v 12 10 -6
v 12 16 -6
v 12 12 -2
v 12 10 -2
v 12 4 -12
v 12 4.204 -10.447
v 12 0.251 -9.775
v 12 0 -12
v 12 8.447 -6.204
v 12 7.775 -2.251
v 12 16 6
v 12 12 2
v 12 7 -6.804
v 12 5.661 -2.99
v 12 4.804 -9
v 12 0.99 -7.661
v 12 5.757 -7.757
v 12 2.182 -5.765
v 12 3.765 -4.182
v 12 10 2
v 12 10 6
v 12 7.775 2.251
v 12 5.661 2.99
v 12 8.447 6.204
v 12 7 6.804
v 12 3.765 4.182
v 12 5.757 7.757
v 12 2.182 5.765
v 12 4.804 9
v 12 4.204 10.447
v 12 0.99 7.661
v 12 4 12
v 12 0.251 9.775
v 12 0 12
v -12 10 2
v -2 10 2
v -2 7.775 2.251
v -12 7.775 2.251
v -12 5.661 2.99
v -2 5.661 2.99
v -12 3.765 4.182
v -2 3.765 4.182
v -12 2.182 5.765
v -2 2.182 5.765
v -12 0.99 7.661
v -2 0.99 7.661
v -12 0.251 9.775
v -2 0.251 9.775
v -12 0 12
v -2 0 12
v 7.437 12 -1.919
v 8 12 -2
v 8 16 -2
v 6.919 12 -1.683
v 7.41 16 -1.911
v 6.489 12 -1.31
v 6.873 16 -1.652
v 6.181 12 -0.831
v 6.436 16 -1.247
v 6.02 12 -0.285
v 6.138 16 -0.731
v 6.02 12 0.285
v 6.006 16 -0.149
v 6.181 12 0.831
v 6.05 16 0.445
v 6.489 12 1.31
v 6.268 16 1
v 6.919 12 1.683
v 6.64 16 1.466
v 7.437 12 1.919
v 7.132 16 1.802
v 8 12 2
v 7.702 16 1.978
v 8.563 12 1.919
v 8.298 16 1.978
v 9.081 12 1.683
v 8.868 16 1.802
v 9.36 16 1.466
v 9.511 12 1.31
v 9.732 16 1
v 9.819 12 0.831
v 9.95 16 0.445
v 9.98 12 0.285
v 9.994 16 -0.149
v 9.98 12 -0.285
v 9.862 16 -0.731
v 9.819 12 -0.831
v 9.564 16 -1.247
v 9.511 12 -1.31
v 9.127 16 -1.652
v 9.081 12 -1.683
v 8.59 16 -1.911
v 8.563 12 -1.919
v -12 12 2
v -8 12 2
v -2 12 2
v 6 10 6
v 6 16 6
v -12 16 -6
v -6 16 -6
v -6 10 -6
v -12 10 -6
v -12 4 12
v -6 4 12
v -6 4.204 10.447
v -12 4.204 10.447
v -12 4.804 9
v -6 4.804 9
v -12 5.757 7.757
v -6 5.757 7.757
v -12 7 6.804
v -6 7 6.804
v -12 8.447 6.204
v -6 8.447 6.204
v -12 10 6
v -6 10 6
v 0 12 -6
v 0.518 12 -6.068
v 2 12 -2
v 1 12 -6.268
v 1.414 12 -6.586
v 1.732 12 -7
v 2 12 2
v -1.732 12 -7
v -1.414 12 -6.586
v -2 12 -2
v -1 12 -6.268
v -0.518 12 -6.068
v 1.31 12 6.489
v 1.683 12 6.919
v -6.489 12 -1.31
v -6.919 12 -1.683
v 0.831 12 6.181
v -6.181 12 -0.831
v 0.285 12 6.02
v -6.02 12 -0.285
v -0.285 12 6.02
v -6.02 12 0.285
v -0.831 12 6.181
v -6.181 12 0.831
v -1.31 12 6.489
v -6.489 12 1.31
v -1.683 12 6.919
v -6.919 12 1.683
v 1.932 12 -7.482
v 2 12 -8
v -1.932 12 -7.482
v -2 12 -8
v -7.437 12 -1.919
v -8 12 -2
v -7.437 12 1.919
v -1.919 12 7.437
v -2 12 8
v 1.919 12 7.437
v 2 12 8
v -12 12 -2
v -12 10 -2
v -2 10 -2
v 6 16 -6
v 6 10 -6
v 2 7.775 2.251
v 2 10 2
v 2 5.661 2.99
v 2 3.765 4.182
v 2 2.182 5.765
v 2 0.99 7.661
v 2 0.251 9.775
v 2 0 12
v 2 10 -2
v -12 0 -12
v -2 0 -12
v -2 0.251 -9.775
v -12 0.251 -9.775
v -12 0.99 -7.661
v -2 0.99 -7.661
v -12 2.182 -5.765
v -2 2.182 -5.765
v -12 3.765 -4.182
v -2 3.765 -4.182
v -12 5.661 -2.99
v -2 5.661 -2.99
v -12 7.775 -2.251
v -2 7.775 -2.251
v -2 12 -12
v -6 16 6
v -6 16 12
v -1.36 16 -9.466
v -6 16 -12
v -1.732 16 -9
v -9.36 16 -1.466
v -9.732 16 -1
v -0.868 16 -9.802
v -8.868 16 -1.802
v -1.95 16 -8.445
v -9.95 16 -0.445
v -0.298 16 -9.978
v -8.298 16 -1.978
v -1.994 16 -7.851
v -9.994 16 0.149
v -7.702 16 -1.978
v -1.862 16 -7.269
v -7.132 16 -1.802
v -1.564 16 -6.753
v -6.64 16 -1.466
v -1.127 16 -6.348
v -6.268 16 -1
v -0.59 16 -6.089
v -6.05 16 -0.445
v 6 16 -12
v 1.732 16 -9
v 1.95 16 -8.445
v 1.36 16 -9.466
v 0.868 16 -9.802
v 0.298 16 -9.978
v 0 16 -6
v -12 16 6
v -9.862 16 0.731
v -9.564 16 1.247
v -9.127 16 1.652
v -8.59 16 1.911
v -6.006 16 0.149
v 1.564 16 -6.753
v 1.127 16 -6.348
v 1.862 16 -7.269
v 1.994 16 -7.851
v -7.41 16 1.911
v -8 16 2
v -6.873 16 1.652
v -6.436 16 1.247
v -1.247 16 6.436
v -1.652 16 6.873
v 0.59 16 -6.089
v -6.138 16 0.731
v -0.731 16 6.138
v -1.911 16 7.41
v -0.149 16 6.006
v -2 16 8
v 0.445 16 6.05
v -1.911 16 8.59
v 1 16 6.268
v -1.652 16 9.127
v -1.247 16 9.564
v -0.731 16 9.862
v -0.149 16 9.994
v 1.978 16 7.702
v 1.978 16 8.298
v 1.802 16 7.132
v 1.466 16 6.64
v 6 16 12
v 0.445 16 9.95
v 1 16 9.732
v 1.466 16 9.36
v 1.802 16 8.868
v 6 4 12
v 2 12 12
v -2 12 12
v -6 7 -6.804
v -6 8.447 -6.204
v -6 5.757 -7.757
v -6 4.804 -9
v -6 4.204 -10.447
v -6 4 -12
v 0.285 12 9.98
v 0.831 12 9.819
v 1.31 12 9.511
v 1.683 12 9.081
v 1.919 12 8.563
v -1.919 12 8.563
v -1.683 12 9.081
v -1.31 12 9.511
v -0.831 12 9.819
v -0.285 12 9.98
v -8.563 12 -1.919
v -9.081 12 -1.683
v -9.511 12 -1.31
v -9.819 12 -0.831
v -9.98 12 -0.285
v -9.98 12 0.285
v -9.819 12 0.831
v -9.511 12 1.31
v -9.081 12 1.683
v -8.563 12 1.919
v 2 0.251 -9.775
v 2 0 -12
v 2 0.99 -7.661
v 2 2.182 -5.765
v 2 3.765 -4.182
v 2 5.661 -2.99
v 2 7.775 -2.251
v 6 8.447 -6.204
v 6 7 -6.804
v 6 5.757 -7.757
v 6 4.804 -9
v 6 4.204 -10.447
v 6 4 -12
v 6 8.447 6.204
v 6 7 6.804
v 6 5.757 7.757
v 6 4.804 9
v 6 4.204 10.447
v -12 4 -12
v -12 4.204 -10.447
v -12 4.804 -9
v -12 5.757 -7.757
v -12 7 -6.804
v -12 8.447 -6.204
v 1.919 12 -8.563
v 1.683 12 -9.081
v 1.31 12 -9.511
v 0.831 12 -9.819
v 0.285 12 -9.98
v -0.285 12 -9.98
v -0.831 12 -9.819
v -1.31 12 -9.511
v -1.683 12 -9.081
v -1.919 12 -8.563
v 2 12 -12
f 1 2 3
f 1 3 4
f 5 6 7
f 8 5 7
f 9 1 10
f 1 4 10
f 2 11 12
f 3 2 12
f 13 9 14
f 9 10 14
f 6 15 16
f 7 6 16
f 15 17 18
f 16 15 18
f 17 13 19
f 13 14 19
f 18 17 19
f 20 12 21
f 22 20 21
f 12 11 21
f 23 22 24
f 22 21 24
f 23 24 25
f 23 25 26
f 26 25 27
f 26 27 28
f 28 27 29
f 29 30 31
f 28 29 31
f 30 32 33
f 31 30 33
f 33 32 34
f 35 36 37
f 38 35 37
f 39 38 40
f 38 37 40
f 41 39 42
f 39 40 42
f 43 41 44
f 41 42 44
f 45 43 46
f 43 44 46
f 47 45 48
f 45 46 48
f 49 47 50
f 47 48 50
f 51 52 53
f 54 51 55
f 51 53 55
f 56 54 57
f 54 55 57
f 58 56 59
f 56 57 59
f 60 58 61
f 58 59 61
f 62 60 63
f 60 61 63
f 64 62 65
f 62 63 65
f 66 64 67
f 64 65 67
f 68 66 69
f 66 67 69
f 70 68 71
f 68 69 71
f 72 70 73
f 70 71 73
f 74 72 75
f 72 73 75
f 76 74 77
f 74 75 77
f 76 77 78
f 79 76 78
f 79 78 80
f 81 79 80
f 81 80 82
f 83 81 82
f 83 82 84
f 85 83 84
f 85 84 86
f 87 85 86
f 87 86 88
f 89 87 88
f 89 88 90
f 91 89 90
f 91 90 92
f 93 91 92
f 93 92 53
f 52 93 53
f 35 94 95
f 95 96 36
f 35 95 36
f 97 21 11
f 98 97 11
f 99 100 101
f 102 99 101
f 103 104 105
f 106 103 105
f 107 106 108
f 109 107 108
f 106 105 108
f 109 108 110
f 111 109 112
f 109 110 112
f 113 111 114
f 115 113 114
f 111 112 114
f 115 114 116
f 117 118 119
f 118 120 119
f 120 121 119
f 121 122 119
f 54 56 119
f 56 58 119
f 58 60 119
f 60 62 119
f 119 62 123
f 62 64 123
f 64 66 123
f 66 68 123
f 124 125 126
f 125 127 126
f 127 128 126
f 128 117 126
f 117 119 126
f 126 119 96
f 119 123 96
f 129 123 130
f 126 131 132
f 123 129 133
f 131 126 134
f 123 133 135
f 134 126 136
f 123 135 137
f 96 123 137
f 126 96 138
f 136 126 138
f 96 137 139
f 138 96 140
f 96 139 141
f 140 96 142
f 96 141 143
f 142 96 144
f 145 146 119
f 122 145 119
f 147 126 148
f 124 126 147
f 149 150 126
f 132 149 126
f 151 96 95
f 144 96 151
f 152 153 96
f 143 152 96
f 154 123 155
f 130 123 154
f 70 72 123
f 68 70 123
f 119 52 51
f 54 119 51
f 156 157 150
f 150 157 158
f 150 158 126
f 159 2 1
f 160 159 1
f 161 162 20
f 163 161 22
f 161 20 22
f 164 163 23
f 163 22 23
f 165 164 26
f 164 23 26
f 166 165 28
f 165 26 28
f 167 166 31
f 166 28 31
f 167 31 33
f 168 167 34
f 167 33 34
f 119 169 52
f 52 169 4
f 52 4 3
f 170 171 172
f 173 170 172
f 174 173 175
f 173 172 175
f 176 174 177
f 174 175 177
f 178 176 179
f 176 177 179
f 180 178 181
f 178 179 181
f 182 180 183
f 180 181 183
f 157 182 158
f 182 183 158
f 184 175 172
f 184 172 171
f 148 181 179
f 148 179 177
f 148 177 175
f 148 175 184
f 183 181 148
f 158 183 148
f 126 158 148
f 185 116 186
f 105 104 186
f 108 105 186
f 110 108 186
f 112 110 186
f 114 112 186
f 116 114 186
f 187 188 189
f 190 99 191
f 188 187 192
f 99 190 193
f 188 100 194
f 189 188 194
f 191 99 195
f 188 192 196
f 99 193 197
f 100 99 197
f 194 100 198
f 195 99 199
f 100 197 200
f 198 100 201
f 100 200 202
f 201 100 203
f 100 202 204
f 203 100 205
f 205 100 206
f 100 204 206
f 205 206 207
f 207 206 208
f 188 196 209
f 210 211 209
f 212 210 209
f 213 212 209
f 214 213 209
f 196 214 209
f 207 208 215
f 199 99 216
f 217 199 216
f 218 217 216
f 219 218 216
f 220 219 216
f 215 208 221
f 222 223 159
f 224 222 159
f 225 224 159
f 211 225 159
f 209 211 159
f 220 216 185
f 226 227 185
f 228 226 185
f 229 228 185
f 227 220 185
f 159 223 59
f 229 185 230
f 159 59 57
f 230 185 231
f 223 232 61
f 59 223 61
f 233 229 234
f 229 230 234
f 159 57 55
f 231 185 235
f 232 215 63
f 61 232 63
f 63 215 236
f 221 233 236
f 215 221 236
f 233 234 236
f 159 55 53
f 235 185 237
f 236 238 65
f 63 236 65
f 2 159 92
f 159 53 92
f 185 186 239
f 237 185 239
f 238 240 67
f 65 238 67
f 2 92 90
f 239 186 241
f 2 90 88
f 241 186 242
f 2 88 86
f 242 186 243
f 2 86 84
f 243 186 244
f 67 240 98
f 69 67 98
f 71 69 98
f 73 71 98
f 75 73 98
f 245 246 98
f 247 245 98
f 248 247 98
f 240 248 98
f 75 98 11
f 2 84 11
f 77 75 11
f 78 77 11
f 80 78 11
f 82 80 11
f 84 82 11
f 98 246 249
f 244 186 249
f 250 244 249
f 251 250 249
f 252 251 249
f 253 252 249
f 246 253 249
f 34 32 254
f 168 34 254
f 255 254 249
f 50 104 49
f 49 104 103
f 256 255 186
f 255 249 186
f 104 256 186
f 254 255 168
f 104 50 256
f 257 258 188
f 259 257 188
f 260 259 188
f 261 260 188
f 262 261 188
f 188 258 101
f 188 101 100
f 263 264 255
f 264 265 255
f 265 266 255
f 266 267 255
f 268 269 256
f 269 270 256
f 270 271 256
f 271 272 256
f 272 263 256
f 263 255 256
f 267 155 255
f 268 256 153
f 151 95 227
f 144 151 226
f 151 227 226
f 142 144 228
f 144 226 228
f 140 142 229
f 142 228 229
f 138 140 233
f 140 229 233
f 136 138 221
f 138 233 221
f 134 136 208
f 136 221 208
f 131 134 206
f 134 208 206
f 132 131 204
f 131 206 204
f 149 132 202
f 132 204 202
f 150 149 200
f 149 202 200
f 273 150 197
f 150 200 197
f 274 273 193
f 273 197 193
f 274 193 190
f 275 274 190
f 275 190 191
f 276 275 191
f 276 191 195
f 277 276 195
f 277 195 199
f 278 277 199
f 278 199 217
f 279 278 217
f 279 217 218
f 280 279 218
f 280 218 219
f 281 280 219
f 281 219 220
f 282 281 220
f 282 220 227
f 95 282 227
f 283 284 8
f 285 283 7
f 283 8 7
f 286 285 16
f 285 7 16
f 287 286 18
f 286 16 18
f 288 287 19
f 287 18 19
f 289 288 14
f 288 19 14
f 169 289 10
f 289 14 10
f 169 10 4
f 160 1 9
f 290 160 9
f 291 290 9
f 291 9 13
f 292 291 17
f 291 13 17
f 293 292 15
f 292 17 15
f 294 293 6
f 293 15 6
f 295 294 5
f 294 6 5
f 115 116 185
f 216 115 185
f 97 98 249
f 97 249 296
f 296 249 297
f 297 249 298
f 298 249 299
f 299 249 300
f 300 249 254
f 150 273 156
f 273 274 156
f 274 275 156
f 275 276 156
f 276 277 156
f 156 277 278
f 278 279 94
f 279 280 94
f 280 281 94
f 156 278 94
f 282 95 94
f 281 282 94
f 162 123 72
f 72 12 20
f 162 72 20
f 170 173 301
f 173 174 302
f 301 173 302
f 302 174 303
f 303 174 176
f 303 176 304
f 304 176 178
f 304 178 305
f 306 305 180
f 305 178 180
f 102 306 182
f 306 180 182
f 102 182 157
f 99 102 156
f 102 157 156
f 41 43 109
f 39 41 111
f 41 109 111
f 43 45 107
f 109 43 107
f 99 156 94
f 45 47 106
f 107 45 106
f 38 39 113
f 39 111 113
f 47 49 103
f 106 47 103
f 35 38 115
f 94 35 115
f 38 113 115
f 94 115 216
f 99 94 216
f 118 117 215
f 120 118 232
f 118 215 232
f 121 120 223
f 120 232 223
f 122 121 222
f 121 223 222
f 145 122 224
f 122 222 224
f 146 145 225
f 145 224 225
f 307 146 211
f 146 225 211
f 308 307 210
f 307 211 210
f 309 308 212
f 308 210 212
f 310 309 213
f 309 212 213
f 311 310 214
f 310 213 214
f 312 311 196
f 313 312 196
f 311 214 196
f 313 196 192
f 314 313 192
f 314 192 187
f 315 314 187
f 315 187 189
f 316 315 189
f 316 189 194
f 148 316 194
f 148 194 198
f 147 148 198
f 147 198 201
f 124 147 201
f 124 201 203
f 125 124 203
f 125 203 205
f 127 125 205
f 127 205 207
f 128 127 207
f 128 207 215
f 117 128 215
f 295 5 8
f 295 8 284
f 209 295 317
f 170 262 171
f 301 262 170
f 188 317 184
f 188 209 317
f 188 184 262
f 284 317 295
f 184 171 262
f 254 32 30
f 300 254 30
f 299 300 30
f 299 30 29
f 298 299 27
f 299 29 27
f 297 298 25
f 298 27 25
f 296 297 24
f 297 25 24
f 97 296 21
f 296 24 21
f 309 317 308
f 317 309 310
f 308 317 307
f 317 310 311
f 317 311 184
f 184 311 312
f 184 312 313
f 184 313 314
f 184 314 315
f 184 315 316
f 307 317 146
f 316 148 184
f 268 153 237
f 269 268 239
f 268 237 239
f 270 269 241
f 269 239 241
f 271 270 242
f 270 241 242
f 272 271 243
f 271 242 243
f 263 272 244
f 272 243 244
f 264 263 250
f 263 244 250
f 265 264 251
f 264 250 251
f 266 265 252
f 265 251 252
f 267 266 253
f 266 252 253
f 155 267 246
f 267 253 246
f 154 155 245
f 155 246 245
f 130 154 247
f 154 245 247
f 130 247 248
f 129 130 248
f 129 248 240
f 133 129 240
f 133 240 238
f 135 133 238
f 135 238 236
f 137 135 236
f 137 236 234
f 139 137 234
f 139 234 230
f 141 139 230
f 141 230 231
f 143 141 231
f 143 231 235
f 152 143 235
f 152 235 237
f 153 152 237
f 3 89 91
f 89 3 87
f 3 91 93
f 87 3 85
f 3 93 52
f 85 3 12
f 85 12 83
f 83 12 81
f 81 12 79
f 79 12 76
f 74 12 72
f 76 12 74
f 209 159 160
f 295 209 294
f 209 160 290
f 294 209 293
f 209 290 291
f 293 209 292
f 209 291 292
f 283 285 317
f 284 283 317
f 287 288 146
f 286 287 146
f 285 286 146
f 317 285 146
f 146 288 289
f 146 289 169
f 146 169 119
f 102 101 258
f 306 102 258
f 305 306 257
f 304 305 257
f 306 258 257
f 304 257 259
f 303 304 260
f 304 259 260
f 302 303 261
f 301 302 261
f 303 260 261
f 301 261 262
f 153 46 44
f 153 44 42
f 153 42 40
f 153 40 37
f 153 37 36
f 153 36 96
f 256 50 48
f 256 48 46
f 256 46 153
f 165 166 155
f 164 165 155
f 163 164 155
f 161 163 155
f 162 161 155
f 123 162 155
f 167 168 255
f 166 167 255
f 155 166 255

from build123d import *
from build123d.topology import SkipClean

# Parameters (mm, degrees)
EXTRUDE_1_DEPTH     = 12
CUT_EXTRUDE_5_DEPTH = 24
EXTRUDE_5_DEPTH     = 24
SKETCH_2_4_W        = 4
SKETCH_2_4_H        = 12
CUT_EXTRUDE_6_DEPTH = 12
SKETCH_9_R          = 2
CUT_EXTRUDE_7_DEPTH = 4


with BuildPart() as part:
    # 草图2 → 凸台-拉伸1 (new, symmetric)
    with BuildSketch(Plane.XY):
        Polygon((2, 12), (2, 0), (12, 0), (12, 4), (6, 4), (6, 16), (-6, 16), (-6, 4), (-12, 4), (-12, 0), (-2, 0), (-2, 12), align=None)
    extrude(amount=EXTRUDE_1_DEPTH, both=True)

    # 草图7 → 切除-拉伸5 (cut)
    with BuildSketch(Plane(origin=(12, 0, 0), x_dir=(0, 0, -1), z_dir=(1, 0, 0))):
        with BuildLine():
            Line((-2, 12), (-2, 10))
            ThreePointArc((-2, 10), (-4.928932188, 2.928932188), (-12, 0))
            Line((-12, 0), (12, 0))
            ThreePointArc((12, 0), (4.928932188, 2.928932188), (2, 10))
            Line((2, 10), (2, 12))
            Line((2, 12), (-2, 12))
        make_face()
    extrude(amount=-CUT_EXTRUDE_5_DEPTH, mode=Mode.SUBTRACT)

    # 草图7<4> → 凸台-拉伸5 (add)
    with SkipClean():  # the faces are left unmerged after this step: merging them gives an invalid solid
        with BuildSketch(Plane(origin=(12, 0, 0), x_dir=(0, 0, -1), z_dir=(1, 0, 0))):
            with BuildLine():
                ThreePointArc((-12, 0), (-4.928932188, 2.928932188), (-2, 10))
                Line((-2, 10), (-2, 12))
                Line((-2, 12), (2, 12))
                Line((2, 12), (2, 10))
                ThreePointArc((2, 10), (4.928932188, 2.928932188), (12, 0))
                Line((12, 0), (12, 4))
                ThreePointArc((12, 4), (7.757359313, 5.757359313), (6, 10))
                Line((6, 10), (6, 16))
                Line((6, 16), (-6, 16))
                Line((-6, 16), (-6, 10))
                ThreePointArc((-6, 10), (-7.757359313, 5.757359313), (-12, 4))
                Line((-12, 4), (-12, 0))
            make_face()
        extrude(amount=-EXTRUDE_5_DEPTH)
    add(part.part.scale(1), mode=Mode.REPLACE)  # the faces are merged on a copy

    # 草图2<4> → 切除-拉伸6 (cut, symmetric)
    with BuildSketch(Plane.XY):
        with Locations((0, 6)):
            Rectangle(SKETCH_2_4_W, SKETCH_2_4_H)
    extrude(amount=CUT_EXTRUDE_6_DEPTH, both=True, mode=Mode.SUBTRACT)

    # 草图9 → 切除-拉伸7 (cut)
    with BuildSketch(Plane(origin=(0, 16, 0), x_dir=(1, 0, 0), z_dir=(0, 1, 0))):
        with Locations((0, 8)):
            Circle(SKETCH_9_R)
        with Locations((-8, 0)):
            Circle(SKETCH_9_R)
        with Locations((8, 0)):
            Circle(SKETCH_9_R)
        with Locations((0, -8)):
            Circle(SKETCH_9_R)
    extrude(amount=-CUT_EXTRUDE_7_DEPTH, mode=Mode.SUBTRACT)


solid = part.part
